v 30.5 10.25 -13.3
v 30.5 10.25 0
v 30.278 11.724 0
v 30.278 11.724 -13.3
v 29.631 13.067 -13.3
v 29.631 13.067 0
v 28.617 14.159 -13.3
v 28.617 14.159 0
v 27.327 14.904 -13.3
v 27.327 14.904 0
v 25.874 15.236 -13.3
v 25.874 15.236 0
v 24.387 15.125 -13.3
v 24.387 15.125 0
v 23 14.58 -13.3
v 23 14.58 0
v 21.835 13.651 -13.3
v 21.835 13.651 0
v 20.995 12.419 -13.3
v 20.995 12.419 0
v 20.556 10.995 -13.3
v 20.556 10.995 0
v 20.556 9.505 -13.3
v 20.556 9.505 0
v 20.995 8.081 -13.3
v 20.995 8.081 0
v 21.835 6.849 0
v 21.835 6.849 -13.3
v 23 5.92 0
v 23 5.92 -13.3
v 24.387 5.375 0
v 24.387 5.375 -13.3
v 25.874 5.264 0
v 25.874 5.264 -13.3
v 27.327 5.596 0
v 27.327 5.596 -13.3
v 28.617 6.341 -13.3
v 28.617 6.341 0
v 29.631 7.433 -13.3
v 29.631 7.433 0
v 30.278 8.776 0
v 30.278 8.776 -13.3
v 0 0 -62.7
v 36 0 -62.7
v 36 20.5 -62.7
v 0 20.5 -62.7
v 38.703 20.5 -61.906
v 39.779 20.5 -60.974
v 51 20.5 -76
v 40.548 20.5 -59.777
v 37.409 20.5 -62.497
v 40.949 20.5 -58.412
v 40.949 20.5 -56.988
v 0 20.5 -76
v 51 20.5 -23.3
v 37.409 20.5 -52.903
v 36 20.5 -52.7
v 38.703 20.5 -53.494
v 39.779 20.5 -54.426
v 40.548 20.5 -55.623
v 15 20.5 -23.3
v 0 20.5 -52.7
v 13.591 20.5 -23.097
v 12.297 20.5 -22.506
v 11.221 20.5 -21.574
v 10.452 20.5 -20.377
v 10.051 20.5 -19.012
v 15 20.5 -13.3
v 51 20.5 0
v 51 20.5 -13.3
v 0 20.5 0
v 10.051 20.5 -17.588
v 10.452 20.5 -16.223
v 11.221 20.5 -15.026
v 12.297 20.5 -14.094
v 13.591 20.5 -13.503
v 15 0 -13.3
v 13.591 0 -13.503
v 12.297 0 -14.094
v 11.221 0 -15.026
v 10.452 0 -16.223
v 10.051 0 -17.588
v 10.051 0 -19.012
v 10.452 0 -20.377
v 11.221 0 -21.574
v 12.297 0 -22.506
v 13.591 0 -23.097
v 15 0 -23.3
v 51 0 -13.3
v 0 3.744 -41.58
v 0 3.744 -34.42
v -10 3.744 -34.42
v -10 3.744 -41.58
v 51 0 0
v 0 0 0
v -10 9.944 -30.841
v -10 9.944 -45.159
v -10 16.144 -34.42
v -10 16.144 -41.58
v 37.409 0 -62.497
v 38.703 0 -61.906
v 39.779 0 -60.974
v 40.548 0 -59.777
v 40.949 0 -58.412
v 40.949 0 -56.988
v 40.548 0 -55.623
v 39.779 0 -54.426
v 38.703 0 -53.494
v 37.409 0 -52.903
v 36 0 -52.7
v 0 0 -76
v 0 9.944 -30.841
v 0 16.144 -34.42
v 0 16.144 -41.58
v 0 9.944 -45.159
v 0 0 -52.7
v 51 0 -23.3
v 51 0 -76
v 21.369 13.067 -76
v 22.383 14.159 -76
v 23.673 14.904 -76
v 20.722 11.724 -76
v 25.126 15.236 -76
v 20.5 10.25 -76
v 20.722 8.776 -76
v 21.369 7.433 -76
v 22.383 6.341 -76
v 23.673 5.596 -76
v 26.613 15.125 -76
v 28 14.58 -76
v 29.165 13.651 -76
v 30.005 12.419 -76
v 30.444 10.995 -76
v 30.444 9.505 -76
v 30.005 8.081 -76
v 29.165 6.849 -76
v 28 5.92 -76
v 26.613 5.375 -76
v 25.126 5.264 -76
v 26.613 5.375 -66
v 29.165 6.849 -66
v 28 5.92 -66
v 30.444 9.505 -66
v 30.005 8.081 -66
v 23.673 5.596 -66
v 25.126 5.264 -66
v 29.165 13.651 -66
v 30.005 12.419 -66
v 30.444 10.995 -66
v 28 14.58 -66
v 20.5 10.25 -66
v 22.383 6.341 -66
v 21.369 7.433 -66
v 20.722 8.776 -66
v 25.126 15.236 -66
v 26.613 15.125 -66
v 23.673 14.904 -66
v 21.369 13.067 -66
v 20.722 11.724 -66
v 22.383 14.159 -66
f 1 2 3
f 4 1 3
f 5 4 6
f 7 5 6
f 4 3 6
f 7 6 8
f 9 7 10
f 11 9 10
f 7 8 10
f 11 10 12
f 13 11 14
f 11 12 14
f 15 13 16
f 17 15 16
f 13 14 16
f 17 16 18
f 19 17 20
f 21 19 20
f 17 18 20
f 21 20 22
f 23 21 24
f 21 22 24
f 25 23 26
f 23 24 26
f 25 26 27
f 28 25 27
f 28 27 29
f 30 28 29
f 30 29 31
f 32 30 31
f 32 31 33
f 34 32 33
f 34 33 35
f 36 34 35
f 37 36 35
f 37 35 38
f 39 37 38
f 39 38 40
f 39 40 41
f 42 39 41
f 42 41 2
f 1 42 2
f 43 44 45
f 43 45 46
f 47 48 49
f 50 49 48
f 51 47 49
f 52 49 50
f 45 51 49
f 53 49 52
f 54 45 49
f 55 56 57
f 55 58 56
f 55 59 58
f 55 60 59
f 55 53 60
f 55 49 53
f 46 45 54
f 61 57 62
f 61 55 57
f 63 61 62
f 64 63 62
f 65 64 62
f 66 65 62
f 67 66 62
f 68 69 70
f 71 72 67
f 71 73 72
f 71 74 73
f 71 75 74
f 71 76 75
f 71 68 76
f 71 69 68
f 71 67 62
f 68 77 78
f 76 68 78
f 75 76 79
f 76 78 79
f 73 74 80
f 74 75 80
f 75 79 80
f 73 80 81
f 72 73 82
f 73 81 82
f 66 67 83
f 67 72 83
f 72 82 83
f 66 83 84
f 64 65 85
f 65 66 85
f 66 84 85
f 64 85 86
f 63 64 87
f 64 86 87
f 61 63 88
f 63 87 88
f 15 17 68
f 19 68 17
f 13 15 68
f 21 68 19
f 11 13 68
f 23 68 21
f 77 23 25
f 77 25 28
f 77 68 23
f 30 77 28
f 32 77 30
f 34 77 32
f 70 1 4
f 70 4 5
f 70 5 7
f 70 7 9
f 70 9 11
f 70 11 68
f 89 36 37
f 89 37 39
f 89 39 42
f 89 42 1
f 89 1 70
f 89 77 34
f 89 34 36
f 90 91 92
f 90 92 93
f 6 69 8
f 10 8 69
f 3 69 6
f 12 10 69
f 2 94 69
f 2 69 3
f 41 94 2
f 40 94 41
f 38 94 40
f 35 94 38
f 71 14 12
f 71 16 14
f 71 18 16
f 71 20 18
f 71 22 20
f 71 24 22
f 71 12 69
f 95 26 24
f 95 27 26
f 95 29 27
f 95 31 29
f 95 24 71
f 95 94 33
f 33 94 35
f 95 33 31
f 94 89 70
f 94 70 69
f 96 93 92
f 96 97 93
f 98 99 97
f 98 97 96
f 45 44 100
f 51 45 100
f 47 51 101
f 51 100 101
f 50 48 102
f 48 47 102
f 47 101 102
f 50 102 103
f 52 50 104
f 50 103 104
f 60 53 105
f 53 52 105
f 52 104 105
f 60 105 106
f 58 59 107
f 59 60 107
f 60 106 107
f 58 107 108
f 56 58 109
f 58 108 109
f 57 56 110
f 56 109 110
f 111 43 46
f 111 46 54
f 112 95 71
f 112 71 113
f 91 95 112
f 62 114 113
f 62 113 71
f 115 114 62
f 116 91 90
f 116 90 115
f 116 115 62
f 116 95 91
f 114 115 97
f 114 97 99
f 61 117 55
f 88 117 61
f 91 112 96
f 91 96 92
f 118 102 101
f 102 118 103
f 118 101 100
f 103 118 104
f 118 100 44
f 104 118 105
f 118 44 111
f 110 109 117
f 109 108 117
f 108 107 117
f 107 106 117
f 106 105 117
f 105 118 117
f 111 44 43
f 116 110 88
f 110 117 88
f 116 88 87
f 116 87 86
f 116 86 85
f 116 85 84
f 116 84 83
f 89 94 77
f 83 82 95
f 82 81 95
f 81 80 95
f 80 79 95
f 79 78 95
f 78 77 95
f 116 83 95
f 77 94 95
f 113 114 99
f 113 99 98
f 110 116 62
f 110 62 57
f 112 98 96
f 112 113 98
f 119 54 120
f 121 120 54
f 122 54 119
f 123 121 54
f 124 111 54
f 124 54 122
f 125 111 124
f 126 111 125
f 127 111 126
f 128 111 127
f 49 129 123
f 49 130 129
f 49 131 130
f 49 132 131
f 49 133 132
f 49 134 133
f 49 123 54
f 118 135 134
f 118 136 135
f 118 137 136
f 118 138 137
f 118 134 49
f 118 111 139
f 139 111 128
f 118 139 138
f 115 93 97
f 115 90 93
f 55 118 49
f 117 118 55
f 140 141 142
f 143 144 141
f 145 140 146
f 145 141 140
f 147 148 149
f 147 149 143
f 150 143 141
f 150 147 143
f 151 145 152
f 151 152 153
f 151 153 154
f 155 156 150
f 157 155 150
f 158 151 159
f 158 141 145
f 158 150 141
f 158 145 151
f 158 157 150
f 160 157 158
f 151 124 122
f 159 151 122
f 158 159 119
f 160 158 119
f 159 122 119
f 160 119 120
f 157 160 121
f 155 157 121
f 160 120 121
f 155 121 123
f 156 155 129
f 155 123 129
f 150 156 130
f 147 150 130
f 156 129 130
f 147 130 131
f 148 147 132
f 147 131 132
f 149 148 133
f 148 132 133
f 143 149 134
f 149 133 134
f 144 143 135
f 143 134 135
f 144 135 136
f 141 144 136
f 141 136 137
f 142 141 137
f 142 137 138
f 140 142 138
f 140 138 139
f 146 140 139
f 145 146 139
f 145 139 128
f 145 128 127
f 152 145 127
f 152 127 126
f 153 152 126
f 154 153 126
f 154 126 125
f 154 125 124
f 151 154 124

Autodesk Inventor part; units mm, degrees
ref_plane "YZ Plane" through (0, 0, 0) normal (1, 0, 0) x (0, 1, 0)
ref_plane "XZ Plane" through (0, 0, 0) normal (0, 1, 0) x (-1, 0, 0)
ref_plane "XY Plane" through (0, 0, 0) normal (0, 0, 1) x (1, 0, 0)
sketch "Sketch1" plane through (0, 0, 0) normal (0, 1, 0) x (-1, 0, 0)
  line L0 (0, 0) -> (0, -52.7)
  line L1 (0, -52.7) -> (-36, -52.7)
  arc A0 (-36, -52.7) -> (-36, -62.7) centre (-36, -57.7) ccw
  line L2 (-36, -62.7) -> (0, -62.7)
  line L3 (0, -62.7) -> (0, -76)
  line L4 (0, -76) -> (-51, -76)
  line L5 (-51, -76) -> (-51, -23.3)
  line L6 (-51, -23.3) -> (-15, -23.3)
  arc A1 (-15, -23.3) -> (-15, -13.3) centre (-15, -18.3) ccw
  line L7 (-15, -13.3) -> (-51, -13.3)
  line L8 (-51, -13.3) -> (-51, 0)
  line L9 (-51, 0) -> (0, 0)
  point P0 (-25.5, -76)
  dimension "d0" = 76
  dimension "d1" = 10
  dimension "d2" = 10
  dimension "d3" = 29.4
  dimension "d4" = 13.3
  dimension "d17" = 51
  dimension "d18" = 15
  dimension "d19" = 15
extrude "Extrusion1" add sketch "Sketch1" along normal blind 20.5
sketch "Sketch2" plane through (0, 0, 0) normal (0, 0, 1) x (1, 0, 0)
  circle A0 centre (25.5, 10.25) radius 5
  line L0 (0, 0) -> (51, 0) projected
  line L1 (0, 0) -> (0, 20.5) projected
  point P0 (25.5, 0)
  point P1 (0, 10.25)
  dimension "d7" = 10
extrude "Extrusion2" cut sketch "Sketch2" against normal up to next
sketch "Sketch3" plane through (51, 0, -76) normal (0, 0, -1) x (-1, 0, 0)
  circle A0 centre (25.5, 10.25) radius 5 projected
  circle A1 centre (25.5, 10.25) radius 5
  point P0 (51, 0)
  point P1 (31.0896, 7.7494)
  point P2 (31.0896, 12.7506)
  point P3 (30.0641, 8.2082)
  point P4 (30.0641, 12.2918)
  dimension "d10" = 5
extrude "Extrusion3" cut sketch "Sketch3" against normal blind 10
sketch "Sketch4" plane through (0, 0, -52.7) normal (-1, 0, 0) x (0, 0, 1)
  line L0 (21.8591, 9.9441) -> (18.2796, 3.7441)
  line L1 (18.2796, 3.7441) -> (11.1204, 3.7441)
  line L2 (11.1204, 3.7441) -> (7.5409, 9.9441)
  line L3 (7.5409, 9.9441) -> (11.1204, 16.1441)
  line L4 (11.1204, 16.1441) -> (18.2796, 16.1441)
  line L5 (18.2796, 16.1441) -> (21.8591, 9.9441)
  line L6 (-23.3, 0) -> (-23.3, 20.5) projected
  point P0 (52.7, 0)
  point P1 (14.7, 9.9441)
  point P2 (-23.3, 10.25)
  dimension "d13" = 12.4
  dimension "d14" = 38
extrude "Extrusion4" add sketch "Sketch4" along normal blind 10
properties part number "tension_sensor"
